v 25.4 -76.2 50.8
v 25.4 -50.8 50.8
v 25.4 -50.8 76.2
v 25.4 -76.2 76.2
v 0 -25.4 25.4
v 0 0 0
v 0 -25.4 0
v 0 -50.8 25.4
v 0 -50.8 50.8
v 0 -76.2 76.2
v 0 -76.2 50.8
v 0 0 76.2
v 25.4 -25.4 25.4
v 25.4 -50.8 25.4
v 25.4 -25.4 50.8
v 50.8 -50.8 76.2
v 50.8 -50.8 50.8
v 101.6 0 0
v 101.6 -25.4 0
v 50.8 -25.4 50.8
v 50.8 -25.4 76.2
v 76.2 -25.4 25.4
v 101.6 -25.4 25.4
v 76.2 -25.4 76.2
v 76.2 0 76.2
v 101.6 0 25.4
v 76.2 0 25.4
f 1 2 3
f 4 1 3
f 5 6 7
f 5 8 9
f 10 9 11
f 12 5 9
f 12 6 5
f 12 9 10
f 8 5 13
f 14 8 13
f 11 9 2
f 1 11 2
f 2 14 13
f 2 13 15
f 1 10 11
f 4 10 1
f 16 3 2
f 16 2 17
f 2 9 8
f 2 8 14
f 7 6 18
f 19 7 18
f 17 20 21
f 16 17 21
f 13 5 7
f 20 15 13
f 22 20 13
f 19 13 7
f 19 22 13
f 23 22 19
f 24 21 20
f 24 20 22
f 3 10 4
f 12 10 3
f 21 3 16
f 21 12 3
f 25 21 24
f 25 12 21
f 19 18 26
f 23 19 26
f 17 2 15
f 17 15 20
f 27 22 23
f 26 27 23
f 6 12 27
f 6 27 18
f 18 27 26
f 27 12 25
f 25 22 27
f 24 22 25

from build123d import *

# Parameters (mm, degrees)
F0_W     = 101.6
F0_H     = 76.2
F1_DEPTH = 25.4
F2_W     = 25.4
F2_H     = 50.8
F3_DEPTH = 25.4
F4_W     = 50.8
F4_H     = 50.8
F5_DEPTH = 25.4
F6_W     = 25.4
F6_H     = 25.4
F7_DEPTH = 25.4
F8_W     = 25.4
F8_H     = 25.4
F9_DEPTH = 25.4


with BuildPart() as f1:
    # F0 (on Front) → F1 (new body)
    with BuildSketch(Plane.XZ):
        with Locations((50.8, 38.1)):
            Rectangle(F0_W, F0_H)
    extrude(amount=F1_DEPTH)

    # F2 (on face) → F3 (cut)
    with BuildSketch(Plane.XZ.offset(25.4)):
        with Locations((88.9, 50.8)):
            Rectangle(F2_W, F2_H)
    extrude(amount=-F3_DEPTH, mode=Mode.SUBTRACT)

    # F4 (on face) → F5 (join)
    with BuildSketch(Plane.XZ.offset(25.4)):
        with Locations((25.4, 50.8)):
            Rectangle(F4_W, F4_H)
    extrude(amount=F5_DEPTH)

    # F6 (on face) → F7 (cut)
    with BuildSketch(Plane.XZ.offset(50.8)):
        with Locations((38.1, 38.1)):
            Rectangle(F6_W, F6_H)
    extrude(amount=-F7_DEPTH, mode=Mode.SUBTRACT)

    # F8 (on face) → F9 (join)
    with BuildSketch(Plane.XZ.offset(50.8)):
        with Locations((12.7, 63.5)):
            Rectangle(F8_W, F8_H)
    extrude(amount=F9_DEPTH)


solid = f1.part
